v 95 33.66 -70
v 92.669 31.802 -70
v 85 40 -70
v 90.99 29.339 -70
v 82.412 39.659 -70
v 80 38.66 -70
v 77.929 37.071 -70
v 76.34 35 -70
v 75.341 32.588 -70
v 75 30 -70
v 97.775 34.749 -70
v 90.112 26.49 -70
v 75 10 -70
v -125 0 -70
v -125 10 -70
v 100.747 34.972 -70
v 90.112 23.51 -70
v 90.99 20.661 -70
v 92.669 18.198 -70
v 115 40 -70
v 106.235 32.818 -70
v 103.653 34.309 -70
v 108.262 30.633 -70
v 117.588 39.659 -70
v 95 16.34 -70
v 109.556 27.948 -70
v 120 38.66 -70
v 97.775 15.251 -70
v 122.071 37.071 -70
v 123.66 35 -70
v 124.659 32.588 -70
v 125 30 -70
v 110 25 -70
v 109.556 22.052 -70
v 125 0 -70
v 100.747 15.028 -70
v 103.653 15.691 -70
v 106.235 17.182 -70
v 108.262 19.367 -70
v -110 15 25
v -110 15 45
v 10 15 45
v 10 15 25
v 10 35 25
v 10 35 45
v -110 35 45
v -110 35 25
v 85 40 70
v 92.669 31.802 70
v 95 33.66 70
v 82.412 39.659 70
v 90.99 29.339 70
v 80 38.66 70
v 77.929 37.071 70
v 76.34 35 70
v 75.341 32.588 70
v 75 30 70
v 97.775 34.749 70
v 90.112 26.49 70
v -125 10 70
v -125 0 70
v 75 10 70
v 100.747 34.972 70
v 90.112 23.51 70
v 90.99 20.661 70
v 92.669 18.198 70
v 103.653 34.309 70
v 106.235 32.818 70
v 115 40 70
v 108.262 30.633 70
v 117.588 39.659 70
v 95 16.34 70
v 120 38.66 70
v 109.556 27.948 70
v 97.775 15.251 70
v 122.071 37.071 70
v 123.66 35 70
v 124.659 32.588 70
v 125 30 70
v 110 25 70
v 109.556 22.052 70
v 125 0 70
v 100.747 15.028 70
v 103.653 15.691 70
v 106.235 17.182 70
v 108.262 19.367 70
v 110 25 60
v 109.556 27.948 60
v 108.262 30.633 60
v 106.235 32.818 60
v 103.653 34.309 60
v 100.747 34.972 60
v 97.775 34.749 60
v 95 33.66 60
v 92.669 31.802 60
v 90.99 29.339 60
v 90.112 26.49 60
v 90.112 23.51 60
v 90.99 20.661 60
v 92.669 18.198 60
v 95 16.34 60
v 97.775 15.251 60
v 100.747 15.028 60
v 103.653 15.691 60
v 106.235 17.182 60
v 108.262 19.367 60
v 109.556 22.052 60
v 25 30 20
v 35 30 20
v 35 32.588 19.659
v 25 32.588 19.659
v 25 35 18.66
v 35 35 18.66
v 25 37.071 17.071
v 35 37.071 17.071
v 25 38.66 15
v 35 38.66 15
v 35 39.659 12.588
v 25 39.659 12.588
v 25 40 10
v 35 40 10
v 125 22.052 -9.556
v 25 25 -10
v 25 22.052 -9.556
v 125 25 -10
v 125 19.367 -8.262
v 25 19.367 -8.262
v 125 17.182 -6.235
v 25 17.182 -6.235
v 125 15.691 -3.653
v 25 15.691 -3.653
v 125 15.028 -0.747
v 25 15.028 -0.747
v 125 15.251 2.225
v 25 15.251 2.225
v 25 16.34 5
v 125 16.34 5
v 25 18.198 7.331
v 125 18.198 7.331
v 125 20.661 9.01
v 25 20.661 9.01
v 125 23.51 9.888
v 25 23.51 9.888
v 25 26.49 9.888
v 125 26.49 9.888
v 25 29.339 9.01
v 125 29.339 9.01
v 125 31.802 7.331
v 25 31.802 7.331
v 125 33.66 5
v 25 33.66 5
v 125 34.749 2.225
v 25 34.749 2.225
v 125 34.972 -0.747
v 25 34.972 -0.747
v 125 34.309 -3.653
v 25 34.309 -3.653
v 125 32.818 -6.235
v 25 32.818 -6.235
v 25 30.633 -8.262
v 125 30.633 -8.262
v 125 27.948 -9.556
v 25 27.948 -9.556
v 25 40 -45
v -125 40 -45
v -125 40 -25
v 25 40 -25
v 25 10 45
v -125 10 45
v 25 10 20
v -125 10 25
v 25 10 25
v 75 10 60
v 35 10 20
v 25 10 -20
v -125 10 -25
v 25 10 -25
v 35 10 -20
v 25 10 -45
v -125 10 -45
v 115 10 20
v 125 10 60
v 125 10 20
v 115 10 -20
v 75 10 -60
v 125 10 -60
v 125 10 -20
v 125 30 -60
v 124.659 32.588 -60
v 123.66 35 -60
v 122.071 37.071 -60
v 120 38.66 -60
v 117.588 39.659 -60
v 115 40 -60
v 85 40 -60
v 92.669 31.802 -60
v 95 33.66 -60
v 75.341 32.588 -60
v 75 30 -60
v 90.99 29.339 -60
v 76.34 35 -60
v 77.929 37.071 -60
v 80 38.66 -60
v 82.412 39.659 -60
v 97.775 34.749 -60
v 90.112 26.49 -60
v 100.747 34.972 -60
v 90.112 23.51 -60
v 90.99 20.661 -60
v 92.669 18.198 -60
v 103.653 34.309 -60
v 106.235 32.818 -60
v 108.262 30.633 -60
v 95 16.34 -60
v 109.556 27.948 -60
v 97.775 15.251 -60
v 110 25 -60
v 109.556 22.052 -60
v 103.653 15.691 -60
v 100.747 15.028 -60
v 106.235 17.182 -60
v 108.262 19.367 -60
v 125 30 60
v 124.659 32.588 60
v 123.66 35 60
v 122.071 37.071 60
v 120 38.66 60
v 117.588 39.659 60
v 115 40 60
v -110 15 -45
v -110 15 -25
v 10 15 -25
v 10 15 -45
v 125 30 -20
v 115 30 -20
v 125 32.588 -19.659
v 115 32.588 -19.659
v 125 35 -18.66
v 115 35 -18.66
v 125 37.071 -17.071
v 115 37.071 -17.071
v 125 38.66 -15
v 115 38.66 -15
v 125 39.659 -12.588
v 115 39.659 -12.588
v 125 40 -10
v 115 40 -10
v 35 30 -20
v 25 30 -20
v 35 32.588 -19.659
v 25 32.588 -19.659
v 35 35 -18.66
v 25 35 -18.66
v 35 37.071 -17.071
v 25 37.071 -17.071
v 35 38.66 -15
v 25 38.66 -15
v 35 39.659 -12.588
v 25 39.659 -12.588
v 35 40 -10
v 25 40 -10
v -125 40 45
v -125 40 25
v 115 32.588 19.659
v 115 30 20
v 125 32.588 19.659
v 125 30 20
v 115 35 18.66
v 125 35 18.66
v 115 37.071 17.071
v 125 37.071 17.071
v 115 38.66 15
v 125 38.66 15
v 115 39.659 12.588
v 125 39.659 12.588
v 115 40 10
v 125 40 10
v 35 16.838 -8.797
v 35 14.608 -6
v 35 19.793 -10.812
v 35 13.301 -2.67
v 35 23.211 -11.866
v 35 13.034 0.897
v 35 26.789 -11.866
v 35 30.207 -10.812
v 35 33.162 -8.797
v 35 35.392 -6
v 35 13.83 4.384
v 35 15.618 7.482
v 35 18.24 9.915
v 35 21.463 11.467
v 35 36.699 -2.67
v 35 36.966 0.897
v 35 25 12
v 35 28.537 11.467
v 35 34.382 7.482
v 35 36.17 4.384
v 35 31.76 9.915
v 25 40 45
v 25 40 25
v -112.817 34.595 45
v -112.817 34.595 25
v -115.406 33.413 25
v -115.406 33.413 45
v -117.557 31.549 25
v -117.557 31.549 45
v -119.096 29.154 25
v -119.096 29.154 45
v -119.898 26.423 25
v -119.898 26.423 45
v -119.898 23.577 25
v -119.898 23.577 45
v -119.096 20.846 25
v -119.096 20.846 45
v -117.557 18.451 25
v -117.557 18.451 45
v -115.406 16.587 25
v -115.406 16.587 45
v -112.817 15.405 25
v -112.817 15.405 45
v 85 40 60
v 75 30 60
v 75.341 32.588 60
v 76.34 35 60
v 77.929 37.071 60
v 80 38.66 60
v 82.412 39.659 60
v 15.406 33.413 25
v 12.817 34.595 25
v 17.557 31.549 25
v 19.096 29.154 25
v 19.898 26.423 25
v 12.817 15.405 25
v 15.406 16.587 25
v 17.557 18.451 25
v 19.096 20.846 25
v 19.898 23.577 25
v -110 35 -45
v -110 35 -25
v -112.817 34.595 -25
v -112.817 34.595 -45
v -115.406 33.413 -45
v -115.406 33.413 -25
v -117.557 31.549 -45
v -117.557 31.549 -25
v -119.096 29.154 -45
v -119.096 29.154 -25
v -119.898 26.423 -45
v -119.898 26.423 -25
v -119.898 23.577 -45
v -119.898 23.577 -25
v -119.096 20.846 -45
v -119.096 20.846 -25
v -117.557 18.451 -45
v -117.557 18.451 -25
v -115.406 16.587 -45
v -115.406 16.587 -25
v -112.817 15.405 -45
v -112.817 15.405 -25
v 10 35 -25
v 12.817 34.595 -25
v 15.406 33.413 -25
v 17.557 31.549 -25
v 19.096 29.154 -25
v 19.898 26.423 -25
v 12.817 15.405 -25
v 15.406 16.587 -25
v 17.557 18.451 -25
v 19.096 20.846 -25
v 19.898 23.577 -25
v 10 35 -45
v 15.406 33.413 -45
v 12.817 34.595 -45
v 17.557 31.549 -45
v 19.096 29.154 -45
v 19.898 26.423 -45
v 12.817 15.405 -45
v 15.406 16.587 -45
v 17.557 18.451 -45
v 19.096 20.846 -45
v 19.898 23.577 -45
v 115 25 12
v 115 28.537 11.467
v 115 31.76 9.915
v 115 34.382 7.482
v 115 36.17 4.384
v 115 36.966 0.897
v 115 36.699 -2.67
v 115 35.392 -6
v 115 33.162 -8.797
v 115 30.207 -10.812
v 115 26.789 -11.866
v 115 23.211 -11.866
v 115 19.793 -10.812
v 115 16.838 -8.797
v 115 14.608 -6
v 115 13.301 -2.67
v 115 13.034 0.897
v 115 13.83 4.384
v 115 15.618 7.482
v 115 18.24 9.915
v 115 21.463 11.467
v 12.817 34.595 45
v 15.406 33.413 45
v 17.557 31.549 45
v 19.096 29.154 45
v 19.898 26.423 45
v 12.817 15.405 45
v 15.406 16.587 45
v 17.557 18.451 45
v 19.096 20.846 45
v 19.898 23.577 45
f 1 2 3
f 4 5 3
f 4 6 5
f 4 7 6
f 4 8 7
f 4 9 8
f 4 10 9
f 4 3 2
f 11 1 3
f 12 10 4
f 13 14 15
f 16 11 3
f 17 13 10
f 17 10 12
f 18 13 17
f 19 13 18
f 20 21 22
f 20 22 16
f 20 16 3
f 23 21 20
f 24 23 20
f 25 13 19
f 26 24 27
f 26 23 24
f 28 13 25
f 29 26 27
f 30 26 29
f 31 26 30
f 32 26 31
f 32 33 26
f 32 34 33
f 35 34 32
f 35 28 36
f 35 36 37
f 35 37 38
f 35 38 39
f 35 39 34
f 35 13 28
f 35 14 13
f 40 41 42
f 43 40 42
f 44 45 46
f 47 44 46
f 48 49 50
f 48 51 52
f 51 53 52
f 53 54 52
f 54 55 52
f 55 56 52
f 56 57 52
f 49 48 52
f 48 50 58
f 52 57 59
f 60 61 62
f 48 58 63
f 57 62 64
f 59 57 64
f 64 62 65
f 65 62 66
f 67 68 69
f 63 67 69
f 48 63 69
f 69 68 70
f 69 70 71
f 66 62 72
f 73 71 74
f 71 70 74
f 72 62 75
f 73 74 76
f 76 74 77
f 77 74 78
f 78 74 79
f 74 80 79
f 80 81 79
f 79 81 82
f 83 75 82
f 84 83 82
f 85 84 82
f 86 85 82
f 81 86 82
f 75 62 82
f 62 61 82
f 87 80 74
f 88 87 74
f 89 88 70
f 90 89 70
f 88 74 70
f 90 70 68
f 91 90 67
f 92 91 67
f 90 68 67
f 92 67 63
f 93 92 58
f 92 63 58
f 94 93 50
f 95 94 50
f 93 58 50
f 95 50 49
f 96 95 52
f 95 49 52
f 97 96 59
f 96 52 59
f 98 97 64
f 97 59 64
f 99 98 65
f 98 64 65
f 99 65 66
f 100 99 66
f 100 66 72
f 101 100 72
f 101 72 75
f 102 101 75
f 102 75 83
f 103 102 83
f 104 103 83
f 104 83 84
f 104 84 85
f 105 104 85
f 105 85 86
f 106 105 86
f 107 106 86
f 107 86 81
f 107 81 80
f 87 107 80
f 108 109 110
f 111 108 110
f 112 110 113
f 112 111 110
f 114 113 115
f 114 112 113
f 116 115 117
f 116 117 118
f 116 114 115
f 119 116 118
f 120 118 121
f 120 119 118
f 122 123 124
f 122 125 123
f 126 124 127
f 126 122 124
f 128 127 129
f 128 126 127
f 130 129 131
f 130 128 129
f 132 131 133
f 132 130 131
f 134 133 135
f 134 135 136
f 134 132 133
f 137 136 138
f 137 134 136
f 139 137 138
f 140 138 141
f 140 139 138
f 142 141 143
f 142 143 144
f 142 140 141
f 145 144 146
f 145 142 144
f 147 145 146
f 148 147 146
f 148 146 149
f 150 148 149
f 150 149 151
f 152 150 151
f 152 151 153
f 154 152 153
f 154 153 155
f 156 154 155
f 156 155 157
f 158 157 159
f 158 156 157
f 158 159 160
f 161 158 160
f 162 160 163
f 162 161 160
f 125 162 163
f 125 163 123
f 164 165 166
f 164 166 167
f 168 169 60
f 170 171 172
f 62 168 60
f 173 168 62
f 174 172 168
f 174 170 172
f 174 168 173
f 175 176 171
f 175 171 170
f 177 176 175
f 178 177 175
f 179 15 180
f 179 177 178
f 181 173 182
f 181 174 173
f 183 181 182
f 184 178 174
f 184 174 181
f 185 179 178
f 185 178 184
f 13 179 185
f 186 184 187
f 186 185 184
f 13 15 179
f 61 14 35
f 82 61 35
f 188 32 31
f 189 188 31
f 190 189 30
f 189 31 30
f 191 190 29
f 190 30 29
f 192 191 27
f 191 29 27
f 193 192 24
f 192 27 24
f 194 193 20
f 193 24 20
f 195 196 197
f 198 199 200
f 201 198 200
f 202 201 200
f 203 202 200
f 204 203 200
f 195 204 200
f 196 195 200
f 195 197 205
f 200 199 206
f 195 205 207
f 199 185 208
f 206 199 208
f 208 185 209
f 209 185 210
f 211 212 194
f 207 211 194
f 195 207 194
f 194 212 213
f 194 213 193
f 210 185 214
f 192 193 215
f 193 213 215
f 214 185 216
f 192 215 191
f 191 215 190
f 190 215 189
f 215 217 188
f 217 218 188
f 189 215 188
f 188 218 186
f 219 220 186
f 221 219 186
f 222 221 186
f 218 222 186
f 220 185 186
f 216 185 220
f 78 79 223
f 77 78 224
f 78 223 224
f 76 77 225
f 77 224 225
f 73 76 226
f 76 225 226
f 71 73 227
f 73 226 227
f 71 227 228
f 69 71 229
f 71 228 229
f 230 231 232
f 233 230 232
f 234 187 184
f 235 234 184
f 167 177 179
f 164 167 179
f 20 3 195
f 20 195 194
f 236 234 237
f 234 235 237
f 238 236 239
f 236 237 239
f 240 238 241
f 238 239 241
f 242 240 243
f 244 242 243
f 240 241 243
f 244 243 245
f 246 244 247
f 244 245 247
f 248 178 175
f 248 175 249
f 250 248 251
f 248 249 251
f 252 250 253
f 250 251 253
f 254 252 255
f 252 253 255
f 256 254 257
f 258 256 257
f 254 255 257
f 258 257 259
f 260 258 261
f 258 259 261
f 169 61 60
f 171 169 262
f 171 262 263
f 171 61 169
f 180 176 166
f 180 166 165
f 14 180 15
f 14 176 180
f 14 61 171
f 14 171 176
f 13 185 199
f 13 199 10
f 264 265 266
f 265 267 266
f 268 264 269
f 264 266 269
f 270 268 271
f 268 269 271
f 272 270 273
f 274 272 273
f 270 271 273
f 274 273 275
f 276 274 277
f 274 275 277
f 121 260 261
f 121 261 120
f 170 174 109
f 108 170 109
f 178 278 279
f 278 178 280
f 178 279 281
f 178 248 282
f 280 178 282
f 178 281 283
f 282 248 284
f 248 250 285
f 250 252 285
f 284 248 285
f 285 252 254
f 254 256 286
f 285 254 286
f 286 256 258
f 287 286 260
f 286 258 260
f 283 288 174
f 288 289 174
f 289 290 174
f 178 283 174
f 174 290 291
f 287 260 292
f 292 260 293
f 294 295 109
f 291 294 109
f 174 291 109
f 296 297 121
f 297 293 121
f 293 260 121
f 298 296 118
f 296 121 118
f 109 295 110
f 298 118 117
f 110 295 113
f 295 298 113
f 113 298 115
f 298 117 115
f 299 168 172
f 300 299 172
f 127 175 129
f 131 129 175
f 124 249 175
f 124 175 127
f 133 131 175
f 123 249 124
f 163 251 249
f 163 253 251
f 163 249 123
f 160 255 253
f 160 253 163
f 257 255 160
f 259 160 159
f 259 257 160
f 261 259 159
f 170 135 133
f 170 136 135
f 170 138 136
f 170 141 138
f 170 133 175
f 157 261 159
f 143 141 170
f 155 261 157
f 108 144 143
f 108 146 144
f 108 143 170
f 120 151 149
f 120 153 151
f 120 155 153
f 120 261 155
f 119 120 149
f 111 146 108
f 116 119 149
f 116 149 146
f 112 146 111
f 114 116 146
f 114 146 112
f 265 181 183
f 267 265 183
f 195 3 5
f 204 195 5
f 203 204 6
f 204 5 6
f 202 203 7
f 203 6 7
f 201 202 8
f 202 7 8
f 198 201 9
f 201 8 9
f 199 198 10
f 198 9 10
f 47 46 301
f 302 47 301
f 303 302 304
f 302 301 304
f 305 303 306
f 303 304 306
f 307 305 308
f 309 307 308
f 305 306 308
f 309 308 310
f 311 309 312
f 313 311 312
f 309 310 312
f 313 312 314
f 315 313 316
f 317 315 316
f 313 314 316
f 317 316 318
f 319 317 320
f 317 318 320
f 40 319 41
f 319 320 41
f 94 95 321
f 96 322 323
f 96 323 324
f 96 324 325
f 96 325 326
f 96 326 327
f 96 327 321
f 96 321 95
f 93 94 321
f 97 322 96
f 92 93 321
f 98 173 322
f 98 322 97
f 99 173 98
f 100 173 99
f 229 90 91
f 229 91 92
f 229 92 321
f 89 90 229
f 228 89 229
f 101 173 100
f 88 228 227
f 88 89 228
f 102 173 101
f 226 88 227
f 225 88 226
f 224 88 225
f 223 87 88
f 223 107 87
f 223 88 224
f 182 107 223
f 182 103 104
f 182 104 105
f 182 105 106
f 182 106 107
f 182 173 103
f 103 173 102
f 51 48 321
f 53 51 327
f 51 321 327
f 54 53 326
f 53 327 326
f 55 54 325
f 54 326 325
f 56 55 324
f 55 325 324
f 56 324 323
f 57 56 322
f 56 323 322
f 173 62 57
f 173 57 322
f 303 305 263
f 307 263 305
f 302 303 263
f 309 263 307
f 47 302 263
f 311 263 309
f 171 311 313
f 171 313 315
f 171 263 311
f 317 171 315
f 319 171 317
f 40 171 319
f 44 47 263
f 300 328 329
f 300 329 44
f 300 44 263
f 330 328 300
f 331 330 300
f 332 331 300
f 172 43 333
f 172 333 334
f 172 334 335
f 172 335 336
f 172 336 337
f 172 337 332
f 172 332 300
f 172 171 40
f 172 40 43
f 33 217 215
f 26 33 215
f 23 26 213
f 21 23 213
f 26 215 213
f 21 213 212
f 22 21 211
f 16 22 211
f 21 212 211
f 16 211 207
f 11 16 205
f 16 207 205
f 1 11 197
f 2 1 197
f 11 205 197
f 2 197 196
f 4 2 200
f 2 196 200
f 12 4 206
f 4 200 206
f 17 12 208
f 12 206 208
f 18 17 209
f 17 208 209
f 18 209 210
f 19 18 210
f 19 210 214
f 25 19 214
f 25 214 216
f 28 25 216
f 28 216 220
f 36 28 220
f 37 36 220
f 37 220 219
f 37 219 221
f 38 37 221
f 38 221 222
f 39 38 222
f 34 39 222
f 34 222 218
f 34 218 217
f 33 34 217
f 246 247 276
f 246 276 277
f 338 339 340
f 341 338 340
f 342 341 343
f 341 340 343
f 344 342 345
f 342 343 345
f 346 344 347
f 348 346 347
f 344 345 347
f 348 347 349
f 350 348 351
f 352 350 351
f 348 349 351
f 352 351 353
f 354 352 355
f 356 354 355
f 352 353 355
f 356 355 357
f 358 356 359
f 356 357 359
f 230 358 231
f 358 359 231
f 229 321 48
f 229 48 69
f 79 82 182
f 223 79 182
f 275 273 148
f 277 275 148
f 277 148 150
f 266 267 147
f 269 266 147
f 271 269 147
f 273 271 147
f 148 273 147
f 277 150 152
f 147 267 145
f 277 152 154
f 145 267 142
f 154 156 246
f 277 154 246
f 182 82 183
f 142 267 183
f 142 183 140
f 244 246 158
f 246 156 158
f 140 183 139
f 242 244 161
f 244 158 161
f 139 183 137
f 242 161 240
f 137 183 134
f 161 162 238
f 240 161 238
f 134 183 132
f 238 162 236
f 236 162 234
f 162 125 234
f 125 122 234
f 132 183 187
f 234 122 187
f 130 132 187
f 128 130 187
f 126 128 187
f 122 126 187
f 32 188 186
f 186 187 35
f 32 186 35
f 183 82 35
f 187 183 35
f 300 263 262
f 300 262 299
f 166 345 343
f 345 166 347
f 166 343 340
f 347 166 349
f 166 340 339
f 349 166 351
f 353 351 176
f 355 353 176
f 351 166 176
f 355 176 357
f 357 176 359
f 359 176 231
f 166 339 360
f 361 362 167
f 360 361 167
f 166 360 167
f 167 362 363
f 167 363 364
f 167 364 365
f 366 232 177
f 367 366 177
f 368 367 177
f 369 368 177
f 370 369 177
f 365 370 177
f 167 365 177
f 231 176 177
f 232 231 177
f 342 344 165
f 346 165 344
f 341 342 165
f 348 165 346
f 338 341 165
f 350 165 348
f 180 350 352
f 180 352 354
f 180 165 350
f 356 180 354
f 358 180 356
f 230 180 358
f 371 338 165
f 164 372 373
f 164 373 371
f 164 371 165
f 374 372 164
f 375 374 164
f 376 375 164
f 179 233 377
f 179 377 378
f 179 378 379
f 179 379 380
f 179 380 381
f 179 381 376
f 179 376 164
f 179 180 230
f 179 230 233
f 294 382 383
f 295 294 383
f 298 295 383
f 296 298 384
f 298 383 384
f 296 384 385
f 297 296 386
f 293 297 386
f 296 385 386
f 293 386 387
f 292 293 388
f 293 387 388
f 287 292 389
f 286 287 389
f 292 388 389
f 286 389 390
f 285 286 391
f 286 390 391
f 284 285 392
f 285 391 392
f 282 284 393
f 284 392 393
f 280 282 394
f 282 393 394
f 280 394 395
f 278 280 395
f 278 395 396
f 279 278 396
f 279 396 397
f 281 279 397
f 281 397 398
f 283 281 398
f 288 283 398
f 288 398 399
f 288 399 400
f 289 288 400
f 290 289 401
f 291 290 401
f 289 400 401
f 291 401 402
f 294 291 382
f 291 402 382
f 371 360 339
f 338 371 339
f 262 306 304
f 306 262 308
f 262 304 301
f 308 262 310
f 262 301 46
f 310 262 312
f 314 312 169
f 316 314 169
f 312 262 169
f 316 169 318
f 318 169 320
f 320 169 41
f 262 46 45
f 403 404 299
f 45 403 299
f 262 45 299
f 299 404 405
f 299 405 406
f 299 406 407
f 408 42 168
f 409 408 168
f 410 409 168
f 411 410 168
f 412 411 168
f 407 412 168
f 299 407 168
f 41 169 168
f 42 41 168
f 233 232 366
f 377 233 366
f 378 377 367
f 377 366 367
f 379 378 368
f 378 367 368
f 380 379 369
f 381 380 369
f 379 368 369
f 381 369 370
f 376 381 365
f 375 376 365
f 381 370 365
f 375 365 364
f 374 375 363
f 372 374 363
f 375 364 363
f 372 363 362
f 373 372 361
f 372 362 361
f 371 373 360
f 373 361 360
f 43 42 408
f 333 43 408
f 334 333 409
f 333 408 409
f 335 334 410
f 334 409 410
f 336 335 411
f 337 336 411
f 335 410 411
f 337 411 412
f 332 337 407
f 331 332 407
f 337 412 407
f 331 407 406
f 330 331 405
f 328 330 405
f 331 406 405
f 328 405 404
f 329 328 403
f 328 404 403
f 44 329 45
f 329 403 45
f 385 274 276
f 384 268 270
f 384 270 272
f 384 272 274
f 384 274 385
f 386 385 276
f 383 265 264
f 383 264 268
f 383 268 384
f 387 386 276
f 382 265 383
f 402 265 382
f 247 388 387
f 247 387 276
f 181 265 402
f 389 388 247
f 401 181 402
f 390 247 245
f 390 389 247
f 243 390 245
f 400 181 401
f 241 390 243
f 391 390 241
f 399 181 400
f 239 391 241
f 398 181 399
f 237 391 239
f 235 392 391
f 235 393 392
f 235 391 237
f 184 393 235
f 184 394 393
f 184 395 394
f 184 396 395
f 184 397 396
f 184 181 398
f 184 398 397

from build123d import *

# Parameters (mm, degrees)
SKETCH1_W           = 250
SKETCH1_H           = 140
BOSS_EXTRUDE1_DEPTH = 10
SKETCH2_W           = 150
SKETCH2_H           = 20
SKETCH2_W_2         = 50
BOSS_EXTRUDE2_DEPTH = 30
CUT_EXTRUDE1_DEPTH  = 120
SKETCH4_R           = 10
CUT_EXTRUDE2_DEPTH  = 150
SKETCH6_W           = 10
SKETCH6_H           = 40
CUT_EXTRUDE4_DEPTH  = 150
SKETCH7_R           = 10
CUT_EXTRUDE5_DEPTH  = 150
SKETCH8_R           = 12
SKETCH8_R_2         = 10
BOSS_EXTRUDE3_DEPTH = 80
SKETCH9_W           = 40
SKETCH9_H           = 30
SKETCH9_R           = 10
BOSS_EXTRUDE4_DEPTH = 10
FILLET1_R           = 10
FILLET2_R           = 10
FILLET3_R           = 10
SKETCH13_W          = 50
SKETCH13_H          = 25
SKETCH13_H_2        = 22.244291656
CUT_EXTRUDE6_DEPTH  = 40


with BuildPart() as part:
    # Sketch1 → Boss-Extrude1 (new body)
    with BuildSketch(Plane(origin=(0, 0, 0), x_dir=(1, 0, 0), z_dir=(0, 1, 0))):
        Rectangle(SKETCH1_W, SKETCH1_H)
    extrude(amount=BOSS_EXTRUDE1_DEPTH)

    # Sketch2 → Boss-Extrude2 (add)
    with BuildSketch(Plane(origin=(0, 10, 0), x_dir=(1, 0, 0), z_dir=(0, 1, 0))):
        with Locations((-50, 35)):
            Rectangle(SKETCH2_W, SKETCH2_H)
        with Locations((-50, -35)):
            Rectangle(SKETCH2_W, SKETCH2_H)
        Polygon((125, -20), (125, 0), (125, 20), (105, 20), (105, -20), align=None)
        with Locations((100, 60)):
            Rectangle(SKETCH2_W_2, SKETCH2_H)
        with Locations((100, -60)):
            Rectangle(SKETCH2_W_2, SKETCH2_H)
    extrude(amount=BOSS_EXTRUDE2_DEPTH)

    # Sketch3 → Cut-Extrude1 (cut)
    with BuildSketch(Plane.XY.offset(45)):
        with BuildLine():
            Line((10, 35), (-110, 35))
            ThreePointArc((-110, 35), (-120, 25), (-110, 15))
            Line((-110, 15), (10, 15))
            ThreePointArc((10, 15), (20, 25), (10, 35))
        make_face()
    extrude(amount=-CUT_EXTRUDE1_DEPTH, mode=Mode.SUBTRACT)

    # Sketch4 → Cut-Extrude2 (cut)
    with BuildSketch(Plane.XY.offset(70)):
        with Locations((100, 25)):
            Circle(SKETCH4_R)
    extrude(amount=-CUT_EXTRUDE2_DEPTH, mode=Mode.SUBTRACT)

    # Sketch6 → Cut-Extrude4 (cut)
    with BuildSketch(Plane(origin=(0, 10, 0), x_dir=(1, 0, 0), z_dir=(0, 1, 0))):
        with Locations((110, 0)):
            Rectangle(SKETCH6_W, SKETCH6_H)
    extrude(amount=CUT_EXTRUDE4_DEPTH, mode=Mode.SUBTRACT)

    # Sketch7 → Cut-Extrude5 (cut)
    with BuildSketch(Plane(origin=(125, 0, 0), x_dir=(0, 0, -1), z_dir=(1, 0, 0))):
        with Locations((0, 25)):
            Circle(SKETCH7_R)
    extrude(amount=-CUT_EXTRUDE5_DEPTH, mode=Mode.SUBTRACT)

    # Sketch8 → Boss-Extrude3 (add)
    with BuildSketch(Plane.ZY.offset(-115)):
        with Locations((0, 25)):
            Circle(SKETCH8_R)
        with Locations(Location((0, 25, 0), (0, 0, 180))):
            Circle(SKETCH8_R_2, mode=Mode.SUBTRACT)
    extrude(amount=BOSS_EXTRUDE3_DEPTH)

    # Sketch9 → Boss-Extrude4 (add)
    with BuildSketch(Plane.ZY.offset(-35)):
        with Locations((0, 25)):
            Rectangle(SKETCH9_W, SKETCH9_H)
        with Locations(Location((0, 25, 0), (0, 0, 180))):
            Circle(SKETCH9_R, mode=Mode.SUBTRACT)
    extrude(amount=BOSS_EXTRUDE4_DEPTH)

    # Fillet1
    fillet1_edges = [part.edges().sort_by_distance(p)[0] for p in [
        (30, 40, 20),
        (30, 40, -20),
    ]]
    fillet(fillet1_edges, radius=FILLET1_R)

    # Fillet2
    fillet2_edges = [part.edges().sort_by_distance(p)[0] for p in [
        (120, 40, 20),
        (120, 40, -20),
    ]]
    fillet(fillet2_edges, radius=FILLET2_R)

    # Fillet3
    fillet3_edges = [part.edges().sort_by_distance(p)[0] for p in [
        (75, 40, -60),
        (125, 40, -60),
        (75, 40, 60),
        (125, 40, 60),
    ]]
    fillet(fillet3_edges, radius=FILLET3_R)

    # Sketch13 → Cut-Extrude6 (cut)
    with BuildSketch(Plane(origin=(0, 10, 0), x_dir=(1, 0, 0), z_dir=(0, 1, 0))):
        with Locations((100, 47.5)):
            Rectangle(SKETCH13_W, SKETCH13_H)
        with Locations((100, -48.877854172)):
            Rectangle(SKETCH13_W, SKETCH13_H_2)
    extrude(amount=CUT_EXTRUDE6_DEPTH, mode=Mode.SUBTRACT)


solid = part.part
